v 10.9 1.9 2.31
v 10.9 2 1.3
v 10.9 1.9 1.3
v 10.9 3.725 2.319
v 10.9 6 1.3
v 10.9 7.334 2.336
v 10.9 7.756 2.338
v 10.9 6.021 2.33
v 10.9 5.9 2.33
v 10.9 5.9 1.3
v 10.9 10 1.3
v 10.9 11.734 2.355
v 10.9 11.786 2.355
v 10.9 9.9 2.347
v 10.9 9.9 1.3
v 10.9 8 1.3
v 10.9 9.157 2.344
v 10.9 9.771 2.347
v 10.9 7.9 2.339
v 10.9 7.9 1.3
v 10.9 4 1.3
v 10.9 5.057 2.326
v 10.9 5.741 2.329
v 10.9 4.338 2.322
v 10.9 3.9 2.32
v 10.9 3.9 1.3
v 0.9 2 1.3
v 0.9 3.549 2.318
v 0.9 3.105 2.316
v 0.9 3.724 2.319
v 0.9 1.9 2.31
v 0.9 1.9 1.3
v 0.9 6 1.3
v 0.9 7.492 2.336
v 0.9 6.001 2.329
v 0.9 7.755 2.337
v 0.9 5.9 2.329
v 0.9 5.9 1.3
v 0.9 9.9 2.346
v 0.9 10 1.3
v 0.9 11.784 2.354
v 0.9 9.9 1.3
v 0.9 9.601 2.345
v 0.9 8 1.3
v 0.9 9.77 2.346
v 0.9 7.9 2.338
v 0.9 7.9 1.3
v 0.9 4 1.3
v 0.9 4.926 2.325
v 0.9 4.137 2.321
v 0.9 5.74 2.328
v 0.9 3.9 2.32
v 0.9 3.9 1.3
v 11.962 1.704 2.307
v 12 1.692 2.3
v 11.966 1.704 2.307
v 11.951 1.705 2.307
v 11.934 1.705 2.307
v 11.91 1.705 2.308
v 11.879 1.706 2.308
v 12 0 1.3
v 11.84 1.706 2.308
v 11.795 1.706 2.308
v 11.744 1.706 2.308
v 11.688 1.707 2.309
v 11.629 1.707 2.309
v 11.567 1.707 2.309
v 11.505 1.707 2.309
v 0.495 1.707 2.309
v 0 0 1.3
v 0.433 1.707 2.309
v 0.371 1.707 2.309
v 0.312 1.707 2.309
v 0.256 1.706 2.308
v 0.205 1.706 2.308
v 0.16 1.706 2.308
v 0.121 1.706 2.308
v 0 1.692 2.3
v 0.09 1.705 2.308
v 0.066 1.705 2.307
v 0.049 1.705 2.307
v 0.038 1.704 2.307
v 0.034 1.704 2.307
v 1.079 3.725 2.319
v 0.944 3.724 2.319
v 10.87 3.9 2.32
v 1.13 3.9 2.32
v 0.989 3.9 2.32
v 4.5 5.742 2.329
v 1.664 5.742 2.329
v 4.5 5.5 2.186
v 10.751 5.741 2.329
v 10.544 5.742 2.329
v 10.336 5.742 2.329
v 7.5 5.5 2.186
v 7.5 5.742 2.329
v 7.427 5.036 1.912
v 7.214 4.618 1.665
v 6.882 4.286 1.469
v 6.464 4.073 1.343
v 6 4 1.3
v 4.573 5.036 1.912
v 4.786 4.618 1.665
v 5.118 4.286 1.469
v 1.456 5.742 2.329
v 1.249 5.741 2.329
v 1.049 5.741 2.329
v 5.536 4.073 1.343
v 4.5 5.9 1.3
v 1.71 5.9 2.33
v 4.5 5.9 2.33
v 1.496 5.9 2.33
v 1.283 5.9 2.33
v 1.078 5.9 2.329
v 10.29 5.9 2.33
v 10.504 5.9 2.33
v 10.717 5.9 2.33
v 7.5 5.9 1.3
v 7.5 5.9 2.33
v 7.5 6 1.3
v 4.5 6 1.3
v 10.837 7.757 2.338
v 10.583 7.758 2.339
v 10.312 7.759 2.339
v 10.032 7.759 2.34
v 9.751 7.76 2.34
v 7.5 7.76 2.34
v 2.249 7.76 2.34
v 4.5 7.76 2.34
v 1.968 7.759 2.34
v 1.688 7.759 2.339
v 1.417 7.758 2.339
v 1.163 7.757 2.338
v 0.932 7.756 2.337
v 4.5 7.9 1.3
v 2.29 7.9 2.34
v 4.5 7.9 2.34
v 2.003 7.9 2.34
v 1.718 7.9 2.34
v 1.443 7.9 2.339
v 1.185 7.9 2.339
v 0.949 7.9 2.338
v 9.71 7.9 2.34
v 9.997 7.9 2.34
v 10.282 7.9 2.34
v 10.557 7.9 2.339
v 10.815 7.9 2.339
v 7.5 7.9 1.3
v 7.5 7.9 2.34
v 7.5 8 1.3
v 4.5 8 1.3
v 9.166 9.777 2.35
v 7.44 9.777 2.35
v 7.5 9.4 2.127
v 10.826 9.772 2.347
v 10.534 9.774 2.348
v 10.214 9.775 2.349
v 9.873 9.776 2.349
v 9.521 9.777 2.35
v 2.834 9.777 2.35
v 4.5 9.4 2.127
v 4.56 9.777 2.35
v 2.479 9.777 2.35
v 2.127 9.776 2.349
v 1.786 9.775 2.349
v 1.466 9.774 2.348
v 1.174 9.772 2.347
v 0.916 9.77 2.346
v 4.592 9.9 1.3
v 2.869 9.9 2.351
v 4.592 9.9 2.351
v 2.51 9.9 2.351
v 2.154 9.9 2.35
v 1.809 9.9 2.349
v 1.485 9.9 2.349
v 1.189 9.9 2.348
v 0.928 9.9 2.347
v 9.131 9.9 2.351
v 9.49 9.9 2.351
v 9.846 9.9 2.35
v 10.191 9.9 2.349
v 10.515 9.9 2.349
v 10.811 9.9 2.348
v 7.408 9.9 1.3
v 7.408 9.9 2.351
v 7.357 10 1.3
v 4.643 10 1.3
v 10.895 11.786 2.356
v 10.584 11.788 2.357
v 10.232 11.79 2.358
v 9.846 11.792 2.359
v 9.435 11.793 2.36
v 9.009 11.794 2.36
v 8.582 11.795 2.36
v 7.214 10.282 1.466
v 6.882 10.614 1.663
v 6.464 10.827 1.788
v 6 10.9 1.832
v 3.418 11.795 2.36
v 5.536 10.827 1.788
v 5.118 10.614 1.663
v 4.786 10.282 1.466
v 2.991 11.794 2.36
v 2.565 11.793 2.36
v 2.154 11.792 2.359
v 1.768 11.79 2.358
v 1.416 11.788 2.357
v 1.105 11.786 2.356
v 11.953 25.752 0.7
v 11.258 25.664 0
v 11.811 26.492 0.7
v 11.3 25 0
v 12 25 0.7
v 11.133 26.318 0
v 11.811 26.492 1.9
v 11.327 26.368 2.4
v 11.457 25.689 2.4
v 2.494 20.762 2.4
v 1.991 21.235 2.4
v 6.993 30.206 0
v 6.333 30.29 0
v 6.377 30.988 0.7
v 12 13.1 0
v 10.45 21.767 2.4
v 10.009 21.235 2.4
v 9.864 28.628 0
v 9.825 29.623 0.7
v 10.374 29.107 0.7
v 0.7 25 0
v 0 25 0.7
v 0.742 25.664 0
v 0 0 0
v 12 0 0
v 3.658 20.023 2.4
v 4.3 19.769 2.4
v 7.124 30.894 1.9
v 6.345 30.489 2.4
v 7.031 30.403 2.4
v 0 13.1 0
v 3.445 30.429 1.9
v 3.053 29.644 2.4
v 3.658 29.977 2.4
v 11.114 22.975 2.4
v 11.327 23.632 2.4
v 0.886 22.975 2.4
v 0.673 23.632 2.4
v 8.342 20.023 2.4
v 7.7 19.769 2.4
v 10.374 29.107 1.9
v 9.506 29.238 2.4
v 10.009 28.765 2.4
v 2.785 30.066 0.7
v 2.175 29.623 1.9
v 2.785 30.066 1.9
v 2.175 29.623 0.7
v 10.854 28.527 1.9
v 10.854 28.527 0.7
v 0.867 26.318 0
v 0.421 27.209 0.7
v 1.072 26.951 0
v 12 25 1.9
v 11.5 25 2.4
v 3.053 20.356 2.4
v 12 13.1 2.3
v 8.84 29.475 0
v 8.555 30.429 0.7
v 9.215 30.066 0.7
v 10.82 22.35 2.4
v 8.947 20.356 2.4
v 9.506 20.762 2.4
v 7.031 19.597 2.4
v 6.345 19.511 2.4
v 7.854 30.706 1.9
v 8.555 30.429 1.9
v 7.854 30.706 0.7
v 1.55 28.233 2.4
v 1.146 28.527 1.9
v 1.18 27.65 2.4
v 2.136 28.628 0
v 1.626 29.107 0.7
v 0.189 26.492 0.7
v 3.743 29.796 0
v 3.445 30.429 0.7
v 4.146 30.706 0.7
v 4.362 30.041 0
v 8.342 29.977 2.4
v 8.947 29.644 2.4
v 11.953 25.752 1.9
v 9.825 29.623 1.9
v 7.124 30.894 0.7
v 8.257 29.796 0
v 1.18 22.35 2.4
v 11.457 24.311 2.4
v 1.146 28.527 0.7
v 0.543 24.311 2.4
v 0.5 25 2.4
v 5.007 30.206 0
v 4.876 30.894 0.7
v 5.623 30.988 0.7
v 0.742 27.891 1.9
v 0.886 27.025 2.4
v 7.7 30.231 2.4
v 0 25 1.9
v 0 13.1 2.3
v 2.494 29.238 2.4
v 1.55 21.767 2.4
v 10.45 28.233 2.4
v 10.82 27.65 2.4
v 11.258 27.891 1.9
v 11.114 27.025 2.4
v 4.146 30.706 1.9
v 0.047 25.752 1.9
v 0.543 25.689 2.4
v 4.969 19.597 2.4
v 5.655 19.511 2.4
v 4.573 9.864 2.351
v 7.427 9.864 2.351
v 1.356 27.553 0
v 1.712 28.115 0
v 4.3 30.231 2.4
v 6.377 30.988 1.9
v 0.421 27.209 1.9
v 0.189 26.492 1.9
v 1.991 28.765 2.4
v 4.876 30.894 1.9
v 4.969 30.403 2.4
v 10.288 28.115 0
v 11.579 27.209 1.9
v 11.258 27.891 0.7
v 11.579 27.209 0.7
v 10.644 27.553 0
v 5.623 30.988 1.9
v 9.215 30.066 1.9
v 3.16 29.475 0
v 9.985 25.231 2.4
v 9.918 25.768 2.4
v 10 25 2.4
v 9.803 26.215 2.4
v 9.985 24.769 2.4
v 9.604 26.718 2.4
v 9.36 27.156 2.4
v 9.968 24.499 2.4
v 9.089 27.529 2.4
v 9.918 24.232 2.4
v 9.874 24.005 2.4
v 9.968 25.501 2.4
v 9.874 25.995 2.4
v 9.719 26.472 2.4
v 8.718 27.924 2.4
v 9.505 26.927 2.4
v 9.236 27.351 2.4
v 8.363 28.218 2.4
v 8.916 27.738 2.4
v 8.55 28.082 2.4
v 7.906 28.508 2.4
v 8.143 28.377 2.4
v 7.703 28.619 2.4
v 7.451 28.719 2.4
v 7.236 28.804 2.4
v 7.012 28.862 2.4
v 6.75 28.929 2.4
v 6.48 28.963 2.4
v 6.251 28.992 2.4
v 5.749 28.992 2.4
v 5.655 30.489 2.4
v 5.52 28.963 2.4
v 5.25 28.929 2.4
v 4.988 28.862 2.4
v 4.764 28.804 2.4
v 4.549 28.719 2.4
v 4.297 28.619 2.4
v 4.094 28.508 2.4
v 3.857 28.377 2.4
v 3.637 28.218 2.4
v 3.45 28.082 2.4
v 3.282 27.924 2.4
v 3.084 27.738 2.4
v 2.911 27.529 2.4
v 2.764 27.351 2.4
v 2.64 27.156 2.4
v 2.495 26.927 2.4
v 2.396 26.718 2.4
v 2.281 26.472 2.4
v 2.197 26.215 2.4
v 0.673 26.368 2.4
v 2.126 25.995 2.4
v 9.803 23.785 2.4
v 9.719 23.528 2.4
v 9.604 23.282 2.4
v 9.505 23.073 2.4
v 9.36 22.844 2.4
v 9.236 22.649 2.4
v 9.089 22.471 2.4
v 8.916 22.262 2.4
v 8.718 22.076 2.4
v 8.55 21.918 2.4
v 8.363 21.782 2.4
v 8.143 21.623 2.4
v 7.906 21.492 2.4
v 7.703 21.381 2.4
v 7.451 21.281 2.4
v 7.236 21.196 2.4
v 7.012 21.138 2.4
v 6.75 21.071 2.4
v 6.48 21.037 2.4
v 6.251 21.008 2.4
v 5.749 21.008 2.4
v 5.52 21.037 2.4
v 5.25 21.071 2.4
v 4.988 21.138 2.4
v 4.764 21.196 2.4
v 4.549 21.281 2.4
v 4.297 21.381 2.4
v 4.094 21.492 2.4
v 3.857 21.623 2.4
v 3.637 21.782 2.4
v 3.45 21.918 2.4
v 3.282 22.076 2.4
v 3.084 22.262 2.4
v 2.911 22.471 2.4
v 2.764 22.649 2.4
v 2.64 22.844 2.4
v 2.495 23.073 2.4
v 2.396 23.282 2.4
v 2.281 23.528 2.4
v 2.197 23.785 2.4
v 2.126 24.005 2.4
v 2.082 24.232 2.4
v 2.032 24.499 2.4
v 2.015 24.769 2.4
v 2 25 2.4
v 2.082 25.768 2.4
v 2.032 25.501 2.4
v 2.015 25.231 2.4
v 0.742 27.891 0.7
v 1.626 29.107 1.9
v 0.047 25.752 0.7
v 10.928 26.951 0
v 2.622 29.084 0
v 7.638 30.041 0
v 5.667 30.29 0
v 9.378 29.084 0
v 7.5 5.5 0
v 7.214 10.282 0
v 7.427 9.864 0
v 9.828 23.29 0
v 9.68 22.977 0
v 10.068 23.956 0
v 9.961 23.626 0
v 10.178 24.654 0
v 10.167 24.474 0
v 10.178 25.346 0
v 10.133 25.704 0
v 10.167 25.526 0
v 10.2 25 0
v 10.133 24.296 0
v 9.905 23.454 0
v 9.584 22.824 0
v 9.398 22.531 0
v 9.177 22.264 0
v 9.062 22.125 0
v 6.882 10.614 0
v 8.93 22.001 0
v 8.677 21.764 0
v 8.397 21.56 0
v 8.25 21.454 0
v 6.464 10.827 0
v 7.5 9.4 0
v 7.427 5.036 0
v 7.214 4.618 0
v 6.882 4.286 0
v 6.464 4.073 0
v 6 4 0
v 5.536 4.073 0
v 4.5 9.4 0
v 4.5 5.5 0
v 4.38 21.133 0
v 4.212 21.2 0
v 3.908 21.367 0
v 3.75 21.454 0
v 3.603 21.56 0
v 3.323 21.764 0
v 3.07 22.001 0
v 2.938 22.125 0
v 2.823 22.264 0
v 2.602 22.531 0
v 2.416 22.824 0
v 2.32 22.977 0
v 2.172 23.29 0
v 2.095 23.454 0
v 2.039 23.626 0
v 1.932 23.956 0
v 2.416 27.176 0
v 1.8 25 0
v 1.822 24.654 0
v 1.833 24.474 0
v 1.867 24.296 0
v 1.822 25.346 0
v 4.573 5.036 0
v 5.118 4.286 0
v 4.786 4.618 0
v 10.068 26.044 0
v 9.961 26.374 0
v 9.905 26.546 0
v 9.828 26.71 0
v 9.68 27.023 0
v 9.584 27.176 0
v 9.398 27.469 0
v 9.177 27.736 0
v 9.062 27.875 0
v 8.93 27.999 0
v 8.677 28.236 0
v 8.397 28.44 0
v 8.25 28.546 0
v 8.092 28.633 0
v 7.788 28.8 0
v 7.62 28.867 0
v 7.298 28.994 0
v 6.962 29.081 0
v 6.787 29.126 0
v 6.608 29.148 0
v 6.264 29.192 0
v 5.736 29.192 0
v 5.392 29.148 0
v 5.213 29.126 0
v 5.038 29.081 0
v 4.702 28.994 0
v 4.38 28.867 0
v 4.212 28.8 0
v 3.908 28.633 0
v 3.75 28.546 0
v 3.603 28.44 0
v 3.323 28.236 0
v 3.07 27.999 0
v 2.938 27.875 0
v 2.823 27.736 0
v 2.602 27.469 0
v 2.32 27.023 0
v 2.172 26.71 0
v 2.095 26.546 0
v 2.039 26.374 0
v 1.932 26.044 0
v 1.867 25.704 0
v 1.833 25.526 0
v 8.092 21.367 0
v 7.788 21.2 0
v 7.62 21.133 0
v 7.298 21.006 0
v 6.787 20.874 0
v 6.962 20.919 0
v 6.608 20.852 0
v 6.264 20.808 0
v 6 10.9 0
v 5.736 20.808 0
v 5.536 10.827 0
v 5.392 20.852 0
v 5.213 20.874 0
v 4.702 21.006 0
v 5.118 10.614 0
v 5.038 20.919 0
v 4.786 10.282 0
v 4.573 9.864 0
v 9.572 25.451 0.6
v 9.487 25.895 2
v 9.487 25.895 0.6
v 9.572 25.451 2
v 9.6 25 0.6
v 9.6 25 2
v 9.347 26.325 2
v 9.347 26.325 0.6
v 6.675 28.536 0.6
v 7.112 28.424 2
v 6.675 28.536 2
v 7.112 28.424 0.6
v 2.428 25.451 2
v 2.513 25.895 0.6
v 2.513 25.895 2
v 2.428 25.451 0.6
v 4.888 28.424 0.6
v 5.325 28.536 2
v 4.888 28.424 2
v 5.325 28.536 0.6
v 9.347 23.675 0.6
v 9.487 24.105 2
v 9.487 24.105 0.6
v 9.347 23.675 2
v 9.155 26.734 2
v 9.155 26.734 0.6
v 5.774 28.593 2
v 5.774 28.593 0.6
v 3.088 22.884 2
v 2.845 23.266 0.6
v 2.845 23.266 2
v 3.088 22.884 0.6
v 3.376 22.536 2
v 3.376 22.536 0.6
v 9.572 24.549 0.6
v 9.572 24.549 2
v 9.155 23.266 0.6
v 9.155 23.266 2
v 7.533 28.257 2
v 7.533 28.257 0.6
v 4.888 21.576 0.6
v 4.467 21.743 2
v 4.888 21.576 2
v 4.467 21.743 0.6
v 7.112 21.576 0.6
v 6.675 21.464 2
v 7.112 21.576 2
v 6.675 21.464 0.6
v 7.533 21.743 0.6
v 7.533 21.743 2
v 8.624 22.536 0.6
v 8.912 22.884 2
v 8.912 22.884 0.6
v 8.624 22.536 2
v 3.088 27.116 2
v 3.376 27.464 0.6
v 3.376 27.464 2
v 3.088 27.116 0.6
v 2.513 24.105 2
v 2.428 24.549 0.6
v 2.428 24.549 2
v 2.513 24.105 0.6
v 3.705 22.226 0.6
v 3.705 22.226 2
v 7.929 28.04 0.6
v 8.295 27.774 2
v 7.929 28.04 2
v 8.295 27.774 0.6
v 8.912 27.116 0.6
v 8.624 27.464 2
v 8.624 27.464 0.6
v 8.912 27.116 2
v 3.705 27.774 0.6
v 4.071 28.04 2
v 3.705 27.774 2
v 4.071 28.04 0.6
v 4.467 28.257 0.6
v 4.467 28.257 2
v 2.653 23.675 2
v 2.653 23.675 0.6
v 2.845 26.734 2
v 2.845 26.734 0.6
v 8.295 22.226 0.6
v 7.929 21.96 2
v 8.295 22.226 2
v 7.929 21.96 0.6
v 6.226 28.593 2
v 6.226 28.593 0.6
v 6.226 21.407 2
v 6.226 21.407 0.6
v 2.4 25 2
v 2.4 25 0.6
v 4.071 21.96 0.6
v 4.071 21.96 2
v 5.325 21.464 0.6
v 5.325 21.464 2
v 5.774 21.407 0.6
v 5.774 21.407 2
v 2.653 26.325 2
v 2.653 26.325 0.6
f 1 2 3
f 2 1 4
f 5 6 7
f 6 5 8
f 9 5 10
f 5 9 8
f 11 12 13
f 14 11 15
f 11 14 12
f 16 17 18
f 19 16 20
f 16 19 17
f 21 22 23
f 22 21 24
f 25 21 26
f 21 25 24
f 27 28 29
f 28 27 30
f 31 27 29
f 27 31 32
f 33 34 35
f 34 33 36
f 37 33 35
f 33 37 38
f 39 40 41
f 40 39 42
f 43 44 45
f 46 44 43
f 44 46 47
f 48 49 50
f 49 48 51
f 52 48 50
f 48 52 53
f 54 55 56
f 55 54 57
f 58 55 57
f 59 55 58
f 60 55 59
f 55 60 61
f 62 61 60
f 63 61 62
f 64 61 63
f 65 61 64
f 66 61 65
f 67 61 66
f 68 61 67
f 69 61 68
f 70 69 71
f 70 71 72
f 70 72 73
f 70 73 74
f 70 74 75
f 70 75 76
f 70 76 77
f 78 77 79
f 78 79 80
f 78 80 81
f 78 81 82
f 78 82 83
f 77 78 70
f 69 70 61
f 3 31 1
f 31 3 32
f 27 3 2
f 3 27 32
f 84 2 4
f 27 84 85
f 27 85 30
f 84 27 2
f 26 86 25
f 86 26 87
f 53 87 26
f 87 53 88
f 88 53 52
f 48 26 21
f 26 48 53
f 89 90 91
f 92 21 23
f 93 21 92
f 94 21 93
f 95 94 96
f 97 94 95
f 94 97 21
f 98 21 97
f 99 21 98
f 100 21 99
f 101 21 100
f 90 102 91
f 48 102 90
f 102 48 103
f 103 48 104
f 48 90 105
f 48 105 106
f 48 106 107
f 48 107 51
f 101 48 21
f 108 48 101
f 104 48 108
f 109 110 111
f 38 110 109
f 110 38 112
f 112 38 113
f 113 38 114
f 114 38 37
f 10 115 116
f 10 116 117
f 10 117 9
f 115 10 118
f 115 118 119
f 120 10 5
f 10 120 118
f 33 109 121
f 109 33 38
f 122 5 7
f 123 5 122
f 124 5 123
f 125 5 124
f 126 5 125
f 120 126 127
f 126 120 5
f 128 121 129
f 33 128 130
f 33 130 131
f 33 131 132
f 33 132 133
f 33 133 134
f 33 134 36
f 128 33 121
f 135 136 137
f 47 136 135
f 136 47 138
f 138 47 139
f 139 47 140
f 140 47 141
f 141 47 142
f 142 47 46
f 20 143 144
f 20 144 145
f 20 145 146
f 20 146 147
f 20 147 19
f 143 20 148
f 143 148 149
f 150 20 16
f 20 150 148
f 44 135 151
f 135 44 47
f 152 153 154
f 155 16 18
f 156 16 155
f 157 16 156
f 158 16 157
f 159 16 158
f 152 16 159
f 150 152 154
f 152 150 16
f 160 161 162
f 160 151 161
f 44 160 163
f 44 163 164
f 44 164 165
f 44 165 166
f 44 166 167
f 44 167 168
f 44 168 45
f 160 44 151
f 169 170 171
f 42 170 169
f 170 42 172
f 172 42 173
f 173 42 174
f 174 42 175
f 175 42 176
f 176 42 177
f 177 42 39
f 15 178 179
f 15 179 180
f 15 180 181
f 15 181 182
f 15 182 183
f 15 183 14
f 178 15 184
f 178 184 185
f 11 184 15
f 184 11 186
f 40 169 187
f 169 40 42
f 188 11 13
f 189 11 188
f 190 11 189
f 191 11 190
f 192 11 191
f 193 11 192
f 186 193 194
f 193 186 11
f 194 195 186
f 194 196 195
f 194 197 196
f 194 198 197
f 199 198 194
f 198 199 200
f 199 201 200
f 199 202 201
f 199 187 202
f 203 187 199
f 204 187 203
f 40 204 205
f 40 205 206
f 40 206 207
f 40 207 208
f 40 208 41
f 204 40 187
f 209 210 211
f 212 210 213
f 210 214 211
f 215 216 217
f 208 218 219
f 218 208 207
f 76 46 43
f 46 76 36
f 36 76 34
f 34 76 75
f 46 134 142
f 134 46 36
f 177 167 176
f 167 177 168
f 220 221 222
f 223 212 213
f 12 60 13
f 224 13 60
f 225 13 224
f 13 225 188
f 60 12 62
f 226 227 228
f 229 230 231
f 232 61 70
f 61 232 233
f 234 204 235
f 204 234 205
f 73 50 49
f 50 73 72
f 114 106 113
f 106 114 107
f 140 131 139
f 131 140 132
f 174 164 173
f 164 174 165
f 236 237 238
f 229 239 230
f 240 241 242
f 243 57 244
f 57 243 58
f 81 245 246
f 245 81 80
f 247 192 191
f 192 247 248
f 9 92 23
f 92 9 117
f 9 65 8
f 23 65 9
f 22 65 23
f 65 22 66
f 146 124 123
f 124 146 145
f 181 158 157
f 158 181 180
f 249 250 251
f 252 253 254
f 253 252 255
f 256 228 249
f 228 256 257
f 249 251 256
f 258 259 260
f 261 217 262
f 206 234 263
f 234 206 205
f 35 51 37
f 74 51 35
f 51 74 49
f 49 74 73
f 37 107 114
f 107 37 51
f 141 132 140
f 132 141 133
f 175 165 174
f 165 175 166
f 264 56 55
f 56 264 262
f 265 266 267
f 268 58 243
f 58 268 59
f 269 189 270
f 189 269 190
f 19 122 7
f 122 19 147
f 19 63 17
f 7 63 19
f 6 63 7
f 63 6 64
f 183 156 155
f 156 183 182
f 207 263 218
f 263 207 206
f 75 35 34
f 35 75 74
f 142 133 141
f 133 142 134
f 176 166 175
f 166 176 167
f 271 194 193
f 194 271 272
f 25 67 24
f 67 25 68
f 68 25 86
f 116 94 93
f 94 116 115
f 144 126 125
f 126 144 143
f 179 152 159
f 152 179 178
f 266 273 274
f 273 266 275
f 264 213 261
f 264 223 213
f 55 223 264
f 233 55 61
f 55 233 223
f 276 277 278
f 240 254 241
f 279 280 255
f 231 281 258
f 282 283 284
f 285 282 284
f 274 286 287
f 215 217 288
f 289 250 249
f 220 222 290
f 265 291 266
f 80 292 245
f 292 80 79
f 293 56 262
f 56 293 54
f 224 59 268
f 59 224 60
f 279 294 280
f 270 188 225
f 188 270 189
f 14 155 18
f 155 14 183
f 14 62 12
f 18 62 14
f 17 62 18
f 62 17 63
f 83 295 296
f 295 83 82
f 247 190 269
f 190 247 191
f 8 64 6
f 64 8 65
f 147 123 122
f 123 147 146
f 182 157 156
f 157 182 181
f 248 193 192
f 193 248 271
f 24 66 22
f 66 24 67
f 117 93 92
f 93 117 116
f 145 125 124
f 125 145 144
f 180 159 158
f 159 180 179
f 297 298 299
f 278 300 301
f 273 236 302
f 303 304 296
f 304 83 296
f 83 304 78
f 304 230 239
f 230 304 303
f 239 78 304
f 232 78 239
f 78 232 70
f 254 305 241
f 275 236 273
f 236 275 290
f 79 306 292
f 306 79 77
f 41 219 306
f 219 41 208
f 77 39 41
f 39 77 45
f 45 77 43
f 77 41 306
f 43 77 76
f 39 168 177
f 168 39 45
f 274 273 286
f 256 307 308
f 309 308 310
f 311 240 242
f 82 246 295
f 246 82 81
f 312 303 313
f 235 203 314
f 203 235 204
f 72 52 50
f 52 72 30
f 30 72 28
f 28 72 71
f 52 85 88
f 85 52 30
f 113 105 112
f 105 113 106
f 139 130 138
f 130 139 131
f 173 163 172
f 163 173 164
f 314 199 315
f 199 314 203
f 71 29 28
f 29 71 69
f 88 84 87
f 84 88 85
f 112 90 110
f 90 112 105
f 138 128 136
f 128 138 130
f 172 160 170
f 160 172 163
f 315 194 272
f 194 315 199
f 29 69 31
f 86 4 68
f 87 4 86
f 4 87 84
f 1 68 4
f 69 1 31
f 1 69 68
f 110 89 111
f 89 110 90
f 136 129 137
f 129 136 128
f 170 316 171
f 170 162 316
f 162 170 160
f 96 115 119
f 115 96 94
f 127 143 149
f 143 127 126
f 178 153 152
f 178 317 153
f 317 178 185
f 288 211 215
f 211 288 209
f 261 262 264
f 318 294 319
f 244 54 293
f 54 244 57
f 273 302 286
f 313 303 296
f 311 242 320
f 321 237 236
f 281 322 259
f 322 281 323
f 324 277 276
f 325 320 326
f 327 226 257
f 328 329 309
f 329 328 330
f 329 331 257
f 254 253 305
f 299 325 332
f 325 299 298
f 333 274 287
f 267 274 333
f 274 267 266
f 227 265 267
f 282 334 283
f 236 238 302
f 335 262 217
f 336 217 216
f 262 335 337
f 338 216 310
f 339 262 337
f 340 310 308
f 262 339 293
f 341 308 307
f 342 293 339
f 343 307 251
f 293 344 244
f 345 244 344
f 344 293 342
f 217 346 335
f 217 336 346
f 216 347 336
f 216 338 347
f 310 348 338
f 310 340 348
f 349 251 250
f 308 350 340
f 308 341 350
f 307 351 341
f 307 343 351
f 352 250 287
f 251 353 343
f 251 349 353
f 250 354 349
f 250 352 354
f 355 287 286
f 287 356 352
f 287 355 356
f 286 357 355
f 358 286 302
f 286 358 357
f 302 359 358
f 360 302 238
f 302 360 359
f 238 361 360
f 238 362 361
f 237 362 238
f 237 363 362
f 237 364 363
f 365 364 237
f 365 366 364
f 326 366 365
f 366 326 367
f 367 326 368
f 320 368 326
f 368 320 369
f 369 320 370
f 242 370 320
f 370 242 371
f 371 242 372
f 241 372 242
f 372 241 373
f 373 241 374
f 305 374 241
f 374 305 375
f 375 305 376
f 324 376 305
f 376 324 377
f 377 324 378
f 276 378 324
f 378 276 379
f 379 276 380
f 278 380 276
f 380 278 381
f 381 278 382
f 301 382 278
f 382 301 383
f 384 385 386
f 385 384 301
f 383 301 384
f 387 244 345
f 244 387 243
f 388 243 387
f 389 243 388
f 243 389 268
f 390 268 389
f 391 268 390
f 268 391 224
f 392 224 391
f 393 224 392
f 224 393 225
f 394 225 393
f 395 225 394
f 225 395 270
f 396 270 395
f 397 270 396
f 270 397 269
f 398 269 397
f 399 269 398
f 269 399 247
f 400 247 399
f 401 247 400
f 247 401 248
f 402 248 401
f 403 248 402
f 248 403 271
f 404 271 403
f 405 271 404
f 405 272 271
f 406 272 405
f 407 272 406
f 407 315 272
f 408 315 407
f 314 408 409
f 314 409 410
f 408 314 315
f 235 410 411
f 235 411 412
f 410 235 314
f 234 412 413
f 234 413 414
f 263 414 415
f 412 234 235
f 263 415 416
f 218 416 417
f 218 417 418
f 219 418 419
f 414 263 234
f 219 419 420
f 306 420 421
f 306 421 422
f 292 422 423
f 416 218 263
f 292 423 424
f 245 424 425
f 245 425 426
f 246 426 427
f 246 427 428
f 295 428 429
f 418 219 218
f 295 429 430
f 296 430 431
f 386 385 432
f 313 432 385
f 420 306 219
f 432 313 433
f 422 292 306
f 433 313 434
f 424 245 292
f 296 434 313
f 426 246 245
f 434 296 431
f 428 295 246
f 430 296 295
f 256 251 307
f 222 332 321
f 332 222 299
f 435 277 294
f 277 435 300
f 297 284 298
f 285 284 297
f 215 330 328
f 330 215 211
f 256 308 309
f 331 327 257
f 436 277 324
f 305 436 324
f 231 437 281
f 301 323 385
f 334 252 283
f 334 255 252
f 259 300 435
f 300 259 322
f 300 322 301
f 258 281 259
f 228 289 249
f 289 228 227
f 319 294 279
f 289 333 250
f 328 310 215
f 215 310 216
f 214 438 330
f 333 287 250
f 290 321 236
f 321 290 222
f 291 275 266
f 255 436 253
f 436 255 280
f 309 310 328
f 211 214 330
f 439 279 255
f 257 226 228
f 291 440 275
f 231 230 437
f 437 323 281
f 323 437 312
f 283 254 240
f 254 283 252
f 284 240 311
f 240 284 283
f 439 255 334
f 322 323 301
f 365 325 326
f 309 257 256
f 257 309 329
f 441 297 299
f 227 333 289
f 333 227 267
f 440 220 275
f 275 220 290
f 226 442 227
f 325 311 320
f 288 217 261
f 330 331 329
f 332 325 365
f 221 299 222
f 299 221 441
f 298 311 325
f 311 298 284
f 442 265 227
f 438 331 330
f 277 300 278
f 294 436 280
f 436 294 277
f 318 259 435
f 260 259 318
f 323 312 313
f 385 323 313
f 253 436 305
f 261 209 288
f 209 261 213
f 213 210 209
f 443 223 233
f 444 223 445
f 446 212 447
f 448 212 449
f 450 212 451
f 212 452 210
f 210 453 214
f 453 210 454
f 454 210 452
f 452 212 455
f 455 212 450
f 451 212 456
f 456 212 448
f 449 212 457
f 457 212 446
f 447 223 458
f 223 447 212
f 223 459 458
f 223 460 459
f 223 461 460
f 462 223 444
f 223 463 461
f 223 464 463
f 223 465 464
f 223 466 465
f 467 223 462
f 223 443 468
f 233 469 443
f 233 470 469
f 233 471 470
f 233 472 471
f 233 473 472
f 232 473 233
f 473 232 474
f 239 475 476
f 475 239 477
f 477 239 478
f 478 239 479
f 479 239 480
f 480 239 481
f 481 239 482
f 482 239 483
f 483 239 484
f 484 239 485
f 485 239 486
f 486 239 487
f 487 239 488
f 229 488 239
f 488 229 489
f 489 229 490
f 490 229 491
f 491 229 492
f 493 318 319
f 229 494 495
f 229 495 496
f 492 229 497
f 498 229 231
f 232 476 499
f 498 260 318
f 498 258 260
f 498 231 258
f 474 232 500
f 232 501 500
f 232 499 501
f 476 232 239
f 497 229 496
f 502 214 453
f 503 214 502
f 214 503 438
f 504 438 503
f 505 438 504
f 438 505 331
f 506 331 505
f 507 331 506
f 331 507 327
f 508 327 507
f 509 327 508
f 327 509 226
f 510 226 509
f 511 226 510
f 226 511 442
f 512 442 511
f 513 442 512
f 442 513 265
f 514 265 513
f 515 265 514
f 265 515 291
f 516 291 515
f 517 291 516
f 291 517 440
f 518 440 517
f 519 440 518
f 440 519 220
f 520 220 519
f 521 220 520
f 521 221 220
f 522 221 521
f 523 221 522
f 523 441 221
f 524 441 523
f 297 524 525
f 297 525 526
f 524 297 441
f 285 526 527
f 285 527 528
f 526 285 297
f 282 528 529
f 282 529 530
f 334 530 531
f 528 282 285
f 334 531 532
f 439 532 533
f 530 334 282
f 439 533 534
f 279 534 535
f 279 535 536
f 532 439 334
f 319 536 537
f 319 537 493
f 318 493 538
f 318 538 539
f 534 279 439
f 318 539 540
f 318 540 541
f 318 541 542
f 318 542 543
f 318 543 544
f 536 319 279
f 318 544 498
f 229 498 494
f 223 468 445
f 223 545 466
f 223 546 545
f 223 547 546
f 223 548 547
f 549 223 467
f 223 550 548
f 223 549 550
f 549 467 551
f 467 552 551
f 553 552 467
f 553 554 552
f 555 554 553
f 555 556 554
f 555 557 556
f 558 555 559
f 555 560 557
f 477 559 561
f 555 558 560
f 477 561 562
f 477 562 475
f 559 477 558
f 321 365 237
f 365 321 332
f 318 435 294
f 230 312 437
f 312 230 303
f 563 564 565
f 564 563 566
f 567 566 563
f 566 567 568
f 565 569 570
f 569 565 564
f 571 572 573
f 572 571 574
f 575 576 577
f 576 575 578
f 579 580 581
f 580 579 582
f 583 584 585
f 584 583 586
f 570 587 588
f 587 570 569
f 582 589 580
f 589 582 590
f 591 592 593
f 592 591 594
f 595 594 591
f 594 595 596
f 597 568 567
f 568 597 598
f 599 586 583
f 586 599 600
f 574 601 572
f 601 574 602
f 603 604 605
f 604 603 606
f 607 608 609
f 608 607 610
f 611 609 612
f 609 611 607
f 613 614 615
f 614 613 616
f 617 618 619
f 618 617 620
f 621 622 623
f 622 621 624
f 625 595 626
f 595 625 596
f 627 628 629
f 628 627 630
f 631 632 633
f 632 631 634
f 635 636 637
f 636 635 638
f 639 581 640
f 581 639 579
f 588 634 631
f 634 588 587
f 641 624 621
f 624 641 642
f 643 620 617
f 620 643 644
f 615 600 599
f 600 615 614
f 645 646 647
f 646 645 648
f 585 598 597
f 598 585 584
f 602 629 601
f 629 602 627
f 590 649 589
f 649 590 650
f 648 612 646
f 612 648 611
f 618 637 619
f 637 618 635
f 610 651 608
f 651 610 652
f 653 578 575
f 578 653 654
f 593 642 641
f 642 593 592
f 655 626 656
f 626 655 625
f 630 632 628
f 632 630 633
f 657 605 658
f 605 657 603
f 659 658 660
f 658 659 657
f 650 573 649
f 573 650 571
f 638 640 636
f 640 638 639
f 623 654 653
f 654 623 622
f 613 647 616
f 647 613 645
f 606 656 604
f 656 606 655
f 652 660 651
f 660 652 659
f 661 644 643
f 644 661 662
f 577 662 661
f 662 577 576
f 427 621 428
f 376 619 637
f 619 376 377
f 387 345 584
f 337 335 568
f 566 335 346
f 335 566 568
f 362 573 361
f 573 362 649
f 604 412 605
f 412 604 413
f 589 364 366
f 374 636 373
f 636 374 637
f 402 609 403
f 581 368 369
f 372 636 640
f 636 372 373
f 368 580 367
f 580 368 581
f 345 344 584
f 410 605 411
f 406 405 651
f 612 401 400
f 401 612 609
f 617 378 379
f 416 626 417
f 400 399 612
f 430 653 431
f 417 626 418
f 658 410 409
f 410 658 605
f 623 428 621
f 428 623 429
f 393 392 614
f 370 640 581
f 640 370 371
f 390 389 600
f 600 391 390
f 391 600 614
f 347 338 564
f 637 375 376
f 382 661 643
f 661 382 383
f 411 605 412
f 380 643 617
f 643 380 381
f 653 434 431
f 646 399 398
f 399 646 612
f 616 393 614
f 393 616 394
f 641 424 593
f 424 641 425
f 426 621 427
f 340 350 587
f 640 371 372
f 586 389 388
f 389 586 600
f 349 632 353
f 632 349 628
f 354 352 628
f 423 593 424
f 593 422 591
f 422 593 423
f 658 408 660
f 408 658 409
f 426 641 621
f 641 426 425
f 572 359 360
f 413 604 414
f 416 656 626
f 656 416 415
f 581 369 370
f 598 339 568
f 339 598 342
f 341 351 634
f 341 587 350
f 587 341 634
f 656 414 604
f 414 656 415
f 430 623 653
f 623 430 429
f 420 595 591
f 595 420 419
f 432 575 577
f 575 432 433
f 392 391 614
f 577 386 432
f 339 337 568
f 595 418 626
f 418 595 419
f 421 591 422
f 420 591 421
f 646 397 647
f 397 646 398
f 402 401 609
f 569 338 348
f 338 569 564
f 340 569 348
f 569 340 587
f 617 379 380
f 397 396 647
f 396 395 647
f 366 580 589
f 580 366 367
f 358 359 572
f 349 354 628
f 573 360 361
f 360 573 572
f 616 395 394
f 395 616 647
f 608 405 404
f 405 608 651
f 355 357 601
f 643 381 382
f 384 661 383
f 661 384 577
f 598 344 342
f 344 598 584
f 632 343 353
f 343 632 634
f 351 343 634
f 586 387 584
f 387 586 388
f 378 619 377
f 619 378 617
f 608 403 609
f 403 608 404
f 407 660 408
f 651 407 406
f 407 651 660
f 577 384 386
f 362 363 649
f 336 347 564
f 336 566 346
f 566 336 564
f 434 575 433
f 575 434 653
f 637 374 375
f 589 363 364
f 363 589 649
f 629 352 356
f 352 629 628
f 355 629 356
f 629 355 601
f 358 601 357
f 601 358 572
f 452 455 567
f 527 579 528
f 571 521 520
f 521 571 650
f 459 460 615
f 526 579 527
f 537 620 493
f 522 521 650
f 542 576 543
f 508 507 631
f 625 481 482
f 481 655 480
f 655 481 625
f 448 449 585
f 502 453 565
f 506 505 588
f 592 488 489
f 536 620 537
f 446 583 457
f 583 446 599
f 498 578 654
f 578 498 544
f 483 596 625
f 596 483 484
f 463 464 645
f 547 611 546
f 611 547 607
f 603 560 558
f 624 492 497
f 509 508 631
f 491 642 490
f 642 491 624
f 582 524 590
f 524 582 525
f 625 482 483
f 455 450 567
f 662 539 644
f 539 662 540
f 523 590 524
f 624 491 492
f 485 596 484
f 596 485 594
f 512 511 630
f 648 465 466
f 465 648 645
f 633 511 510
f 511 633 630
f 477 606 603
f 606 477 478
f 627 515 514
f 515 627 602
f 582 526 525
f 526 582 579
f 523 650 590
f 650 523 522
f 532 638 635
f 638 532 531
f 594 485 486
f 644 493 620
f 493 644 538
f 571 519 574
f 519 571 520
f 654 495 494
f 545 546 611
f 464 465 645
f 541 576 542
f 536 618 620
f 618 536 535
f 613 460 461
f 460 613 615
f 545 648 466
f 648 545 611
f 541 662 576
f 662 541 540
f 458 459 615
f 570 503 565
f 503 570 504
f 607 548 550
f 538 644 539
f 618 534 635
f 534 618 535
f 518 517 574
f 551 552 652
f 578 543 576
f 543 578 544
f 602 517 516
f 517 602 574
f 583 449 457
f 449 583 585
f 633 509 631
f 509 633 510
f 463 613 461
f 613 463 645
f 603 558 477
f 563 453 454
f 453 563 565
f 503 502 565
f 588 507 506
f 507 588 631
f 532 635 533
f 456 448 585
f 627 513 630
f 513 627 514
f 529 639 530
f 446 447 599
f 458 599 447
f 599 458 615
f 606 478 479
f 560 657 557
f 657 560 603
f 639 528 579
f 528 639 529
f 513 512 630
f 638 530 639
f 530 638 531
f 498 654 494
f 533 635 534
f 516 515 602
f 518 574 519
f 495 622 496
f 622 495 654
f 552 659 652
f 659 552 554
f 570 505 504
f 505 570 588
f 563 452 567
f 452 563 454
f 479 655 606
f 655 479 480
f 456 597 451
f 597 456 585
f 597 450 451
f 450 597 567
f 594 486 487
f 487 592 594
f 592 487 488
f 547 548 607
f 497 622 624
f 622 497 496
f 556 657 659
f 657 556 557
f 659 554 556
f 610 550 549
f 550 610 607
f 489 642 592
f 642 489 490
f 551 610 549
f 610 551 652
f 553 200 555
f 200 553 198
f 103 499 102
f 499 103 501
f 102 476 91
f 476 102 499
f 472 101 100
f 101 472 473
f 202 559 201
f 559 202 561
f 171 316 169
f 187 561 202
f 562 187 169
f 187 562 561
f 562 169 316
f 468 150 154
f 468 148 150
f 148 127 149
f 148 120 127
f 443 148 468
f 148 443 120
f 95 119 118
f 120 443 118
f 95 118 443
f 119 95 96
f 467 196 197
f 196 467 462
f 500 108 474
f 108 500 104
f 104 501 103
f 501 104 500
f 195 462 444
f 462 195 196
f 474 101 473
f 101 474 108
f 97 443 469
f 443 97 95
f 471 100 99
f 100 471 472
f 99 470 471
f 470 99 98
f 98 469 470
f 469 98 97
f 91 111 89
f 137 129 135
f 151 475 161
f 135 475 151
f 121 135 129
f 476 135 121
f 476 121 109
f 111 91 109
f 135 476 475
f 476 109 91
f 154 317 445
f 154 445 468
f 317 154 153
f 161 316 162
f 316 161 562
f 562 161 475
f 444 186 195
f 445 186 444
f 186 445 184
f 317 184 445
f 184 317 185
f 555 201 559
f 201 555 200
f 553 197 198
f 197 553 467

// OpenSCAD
// ********  Canopy Holder **********
// compatible to MPX Cularis / Easyglider
//     Henning Stöcklein 8.5.2016
//     free for non-commercial use
// ******************************

/* [User parameters] */
// Cylinder Outer Radius (MPX:4.5)
r_cyl = 6.0 ; // [5:0.1:7]

// Hole Radius (MPX:3.5)
r_hole = 3.6 ; // [3.3:0.1:4.5]

// Bar length (MPX:20)
blen = 25 ; // [18:0.2:25]

// Bar height (MPX:2.3)
bheight = 2.3 ; // [2:0.1:3]

// Bar width (MPX:10)
bwid = 12 ; // [10:0.2:15]

// Sawtooth length (MPX:8)
sawlen = 10 ; // [8:0.2:15]

// Sawtooth height (MPX:1.0]
sawdep = 1.3 ; // [1.0:0.1:2.0]

// Sawtooth width (MPX:10)
sawwid = 10 ; // [8.0:0.2:15]

// Weight reduction slot?
r_redhole = 1.5 ; // [0:None, 1:Very small, 1.5:Small, 2:Medium, 3:Big]

//******* End of user defined parameters *******

module canopy() 
{
  difference ()
  {
    hull ()
    {  
        translate ([0,0,0]) cube ([bwid,0.1,bheight]) ;
        translate ([0,blen-2*r_cyl,0]) cube ([bwid,0.1,bheight]) ;
        translate ([bwid/2,blen,0]) cylinder (r1=r_cyl-0.7 , r2=r_cyl, h=0.7, $fn=50) ;
        translate ([bwid/2,blen,bheight-0.4]) cylinder (r1=r_cyl, r2=r_cyl-0.5, h=0.5, $fn=50) ;
    }
    translate ([bwid/2,blen,-1]) cylinder (r=r_hole, h=4, $fn=50) ;
    
    // Fasen am Loch
    translate ([bwid/2,blen,bheight-0.3]) cylinder (r1=r_hole, r2=r_hole+1, h=1, $fn=50) ;
    translate ([bwid/2,blen,-0.4]) cylinder (r2=r_hole, r1=r_hole+1, h=1, $fn=50) ;
    
    // Create array of sawtooth steps
    for (i= [0:2:sawlen])
      translate ([-0.1,-0.1,sawdep-1.0]) hull()
      {
        translate ([(bwid-sawwid)/2,i,1.0]) cube ([sawwid,0.1,0.1]) ;
        translate ([(bwid-sawwid)/2,i,bheight]) cube ([sawwid,bheight,0.1]) ;       
      }

    // 1st sawtooth always cuts the complete width 
    translate ([-0.1,-0.1,sawdep-1.0]) hull() 
    {
      translate ([-0.1,0,1.0]) cube ([20,0.1,0.1]) ;
      translate ([-0.1,0,bheight]) cube ([20,bheight,0.1]) ;       
    }
    
    // Weight reduction hole in sawtooth area
    hull()
    {
        translate ([bwid/2,bwid/3+r_redhole,0]) cylinder (r=r_redhole, h=10, center=true, $fn=20) ;
        translate ([bwid/2,blen-2*r_cyl-r_hole,0]) cylinder (r=r_redhole, h=10, center=true, $fn=20) ;
    } // hull
  } // diff
} // module

canopy () ;
